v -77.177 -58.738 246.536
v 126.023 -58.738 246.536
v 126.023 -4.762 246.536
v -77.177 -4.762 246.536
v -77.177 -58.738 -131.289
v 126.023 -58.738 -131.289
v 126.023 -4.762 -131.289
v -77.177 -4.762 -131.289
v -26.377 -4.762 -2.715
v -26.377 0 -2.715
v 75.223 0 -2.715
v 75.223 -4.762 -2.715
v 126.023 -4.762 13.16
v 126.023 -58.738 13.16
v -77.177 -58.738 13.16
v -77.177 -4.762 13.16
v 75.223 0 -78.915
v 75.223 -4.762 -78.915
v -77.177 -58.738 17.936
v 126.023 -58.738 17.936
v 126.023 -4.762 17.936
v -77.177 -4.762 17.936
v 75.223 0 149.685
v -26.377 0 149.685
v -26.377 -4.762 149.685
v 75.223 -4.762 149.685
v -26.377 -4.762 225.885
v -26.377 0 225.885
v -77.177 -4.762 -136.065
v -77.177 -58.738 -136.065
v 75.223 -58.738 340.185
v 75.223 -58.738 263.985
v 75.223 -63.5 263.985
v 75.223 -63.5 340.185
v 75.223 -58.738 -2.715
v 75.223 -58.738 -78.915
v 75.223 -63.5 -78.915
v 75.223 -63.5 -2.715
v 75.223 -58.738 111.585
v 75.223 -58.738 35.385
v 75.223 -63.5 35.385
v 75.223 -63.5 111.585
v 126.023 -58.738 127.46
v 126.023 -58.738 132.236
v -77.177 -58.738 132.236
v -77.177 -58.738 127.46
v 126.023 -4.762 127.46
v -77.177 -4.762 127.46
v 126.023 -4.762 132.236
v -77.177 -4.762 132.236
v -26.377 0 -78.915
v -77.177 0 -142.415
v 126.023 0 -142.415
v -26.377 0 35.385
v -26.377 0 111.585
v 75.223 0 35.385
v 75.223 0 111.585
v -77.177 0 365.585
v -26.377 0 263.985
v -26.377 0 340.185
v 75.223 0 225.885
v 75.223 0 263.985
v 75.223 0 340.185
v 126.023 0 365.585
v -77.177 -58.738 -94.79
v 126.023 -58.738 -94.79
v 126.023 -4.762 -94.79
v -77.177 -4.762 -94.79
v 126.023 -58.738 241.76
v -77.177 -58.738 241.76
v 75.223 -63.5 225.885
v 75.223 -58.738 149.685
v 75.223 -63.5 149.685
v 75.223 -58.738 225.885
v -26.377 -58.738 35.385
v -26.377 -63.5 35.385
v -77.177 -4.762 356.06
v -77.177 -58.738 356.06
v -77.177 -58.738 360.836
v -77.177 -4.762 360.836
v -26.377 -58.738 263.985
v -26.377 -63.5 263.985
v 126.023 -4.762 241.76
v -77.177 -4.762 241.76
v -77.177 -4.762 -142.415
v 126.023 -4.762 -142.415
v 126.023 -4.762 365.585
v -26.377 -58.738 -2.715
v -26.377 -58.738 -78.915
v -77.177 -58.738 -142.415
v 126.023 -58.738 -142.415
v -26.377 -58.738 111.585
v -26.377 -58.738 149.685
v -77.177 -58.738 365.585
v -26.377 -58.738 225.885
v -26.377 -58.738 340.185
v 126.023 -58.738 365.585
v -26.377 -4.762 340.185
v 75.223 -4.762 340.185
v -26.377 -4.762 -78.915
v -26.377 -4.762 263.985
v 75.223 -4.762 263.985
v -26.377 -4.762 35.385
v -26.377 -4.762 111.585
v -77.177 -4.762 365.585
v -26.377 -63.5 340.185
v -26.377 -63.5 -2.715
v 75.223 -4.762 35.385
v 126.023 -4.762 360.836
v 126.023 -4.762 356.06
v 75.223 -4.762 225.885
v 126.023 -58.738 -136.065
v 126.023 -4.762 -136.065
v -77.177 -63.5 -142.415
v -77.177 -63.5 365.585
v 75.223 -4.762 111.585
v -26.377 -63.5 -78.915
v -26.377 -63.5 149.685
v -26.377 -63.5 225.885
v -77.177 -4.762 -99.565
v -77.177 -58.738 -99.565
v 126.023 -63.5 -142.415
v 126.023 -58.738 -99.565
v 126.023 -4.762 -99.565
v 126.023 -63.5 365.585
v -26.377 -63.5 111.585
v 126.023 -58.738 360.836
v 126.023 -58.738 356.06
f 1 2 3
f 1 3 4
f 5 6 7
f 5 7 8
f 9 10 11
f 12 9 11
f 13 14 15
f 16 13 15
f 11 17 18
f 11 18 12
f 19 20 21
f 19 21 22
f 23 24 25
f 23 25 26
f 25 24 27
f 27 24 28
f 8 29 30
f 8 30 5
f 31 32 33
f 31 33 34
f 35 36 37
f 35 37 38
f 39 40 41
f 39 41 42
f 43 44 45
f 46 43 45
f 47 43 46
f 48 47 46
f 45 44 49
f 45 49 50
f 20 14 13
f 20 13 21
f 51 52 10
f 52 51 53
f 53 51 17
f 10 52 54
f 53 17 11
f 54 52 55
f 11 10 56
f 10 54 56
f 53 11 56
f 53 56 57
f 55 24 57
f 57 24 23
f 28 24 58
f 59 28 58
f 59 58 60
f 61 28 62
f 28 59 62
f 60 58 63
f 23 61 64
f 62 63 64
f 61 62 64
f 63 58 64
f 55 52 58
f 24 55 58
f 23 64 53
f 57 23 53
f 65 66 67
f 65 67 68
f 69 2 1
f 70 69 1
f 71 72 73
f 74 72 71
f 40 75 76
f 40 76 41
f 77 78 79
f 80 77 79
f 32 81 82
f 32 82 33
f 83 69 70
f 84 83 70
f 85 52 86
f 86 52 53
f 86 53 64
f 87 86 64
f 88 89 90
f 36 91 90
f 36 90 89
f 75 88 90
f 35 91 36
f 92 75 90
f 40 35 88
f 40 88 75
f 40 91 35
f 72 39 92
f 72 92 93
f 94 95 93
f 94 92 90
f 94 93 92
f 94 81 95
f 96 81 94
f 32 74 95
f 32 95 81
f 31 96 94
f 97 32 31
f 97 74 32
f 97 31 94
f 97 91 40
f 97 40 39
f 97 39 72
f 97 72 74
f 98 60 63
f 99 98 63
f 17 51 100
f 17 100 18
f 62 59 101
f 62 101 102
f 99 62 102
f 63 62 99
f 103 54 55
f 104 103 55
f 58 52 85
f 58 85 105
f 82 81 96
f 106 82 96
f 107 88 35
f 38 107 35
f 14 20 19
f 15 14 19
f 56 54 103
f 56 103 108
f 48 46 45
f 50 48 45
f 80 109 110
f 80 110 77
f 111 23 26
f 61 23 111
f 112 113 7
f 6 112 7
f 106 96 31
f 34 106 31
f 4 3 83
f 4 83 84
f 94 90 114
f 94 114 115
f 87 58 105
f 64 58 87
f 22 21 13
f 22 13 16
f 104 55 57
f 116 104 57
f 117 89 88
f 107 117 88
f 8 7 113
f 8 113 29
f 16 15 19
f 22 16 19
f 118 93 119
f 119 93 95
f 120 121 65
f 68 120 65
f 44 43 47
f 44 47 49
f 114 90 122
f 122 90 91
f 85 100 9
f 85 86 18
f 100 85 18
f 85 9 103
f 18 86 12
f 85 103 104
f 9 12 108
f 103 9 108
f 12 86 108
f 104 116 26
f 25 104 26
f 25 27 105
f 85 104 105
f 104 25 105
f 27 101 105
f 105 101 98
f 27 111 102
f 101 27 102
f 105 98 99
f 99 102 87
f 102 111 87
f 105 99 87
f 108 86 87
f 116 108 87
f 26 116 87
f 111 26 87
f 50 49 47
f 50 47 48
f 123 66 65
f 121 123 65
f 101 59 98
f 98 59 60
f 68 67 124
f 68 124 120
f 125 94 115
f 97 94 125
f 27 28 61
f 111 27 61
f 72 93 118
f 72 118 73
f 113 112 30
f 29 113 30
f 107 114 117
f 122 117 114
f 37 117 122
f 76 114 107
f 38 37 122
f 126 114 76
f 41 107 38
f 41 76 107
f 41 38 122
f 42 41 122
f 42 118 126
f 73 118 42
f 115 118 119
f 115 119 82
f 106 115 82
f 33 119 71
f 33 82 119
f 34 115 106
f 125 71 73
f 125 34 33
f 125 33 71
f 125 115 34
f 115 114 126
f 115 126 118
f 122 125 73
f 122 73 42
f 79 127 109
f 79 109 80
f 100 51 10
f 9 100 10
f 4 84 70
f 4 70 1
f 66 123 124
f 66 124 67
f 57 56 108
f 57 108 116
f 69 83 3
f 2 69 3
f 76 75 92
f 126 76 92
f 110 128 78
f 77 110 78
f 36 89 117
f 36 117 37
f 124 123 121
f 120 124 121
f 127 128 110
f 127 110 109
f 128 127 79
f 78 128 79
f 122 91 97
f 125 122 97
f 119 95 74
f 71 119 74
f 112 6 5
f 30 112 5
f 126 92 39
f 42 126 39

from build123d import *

# Parameters (mm, degrees)
F0_W     = 203.2
F0_H     = 508
F0_W_2   = 101.6
F0_H_2   = 76.2
F1_DEPTH = 63.5
F2_W     = 53.975
F2_H     = 508
F3_DEPTH = 203.201
F4_W     = 203.2
F4_H     = 4.7752
F5_DEPTH = 53.975


with BuildPart() as f1:
    # F0 (on Front) → F1 (new body)
    with BuildSketch(Plane.XZ):
        with Locations((24.423076, 111.585479)):
            Rectangle(F0_W, F0_H)
        with Locations((24.423076, -40.814521)):
            Rectangle(F0_W_2, F0_H_2, mode=Mode.SUBTRACT)
        with Locations((24.423076, 73.485479)):
            Rectangle(F0_W_2, F0_H_2, mode=Mode.SUBTRACT)
        with Locations((24.423076, 187.785479)):
            Rectangle(F0_W_2, F0_H_2, mode=Mode.SUBTRACT)
        with Locations((24.423076, 302.085479)):
            Rectangle(F0_W_2, F0_H_2, mode=Mode.SUBTRACT)
    extrude(amount=F1_DEPTH)

    # F2 (on face) → F3 (cut, through all)
    with BuildSketch(Plane.YZ.offset(126.023076)):
        with Locations((-31.75, 111.585479)):
            Rectangle(F2_W, F2_H)
    extrude(amount=-F3_DEPTH, mode=Mode.SUBTRACT)


with BuildPart() as f5:
    # F4 (on face) → F5 (new body, through all)
    with BuildSketch(Plane(origin=(0, -58.7375, 0), x_dir=(-1, 0, 0), z_dir=(0, 1, 0))):
        with Locations((-24.423076, 358.448079)):
            Rectangle(F4_W, F4_H)
        with Locations((-24.423076, 244.148079)):
            Rectangle(F4_W, F4_H)
        with Locations((-24.423076, 129.848079)):
            Rectangle(F4_W, F4_H)
        with Locations((-24.423076, 15.548079)):
            Rectangle(F4_W, F4_H)
        with Locations((-24.423076, -97.177121)):
            Rectangle(F4_W, F4_H)
        with Locations((-24.423076, -133.676921)):
            Rectangle(F4_W, F4_H)
    extrude(amount=F5_DEPTH)


solid = Compound([f1.part, f5.part])
